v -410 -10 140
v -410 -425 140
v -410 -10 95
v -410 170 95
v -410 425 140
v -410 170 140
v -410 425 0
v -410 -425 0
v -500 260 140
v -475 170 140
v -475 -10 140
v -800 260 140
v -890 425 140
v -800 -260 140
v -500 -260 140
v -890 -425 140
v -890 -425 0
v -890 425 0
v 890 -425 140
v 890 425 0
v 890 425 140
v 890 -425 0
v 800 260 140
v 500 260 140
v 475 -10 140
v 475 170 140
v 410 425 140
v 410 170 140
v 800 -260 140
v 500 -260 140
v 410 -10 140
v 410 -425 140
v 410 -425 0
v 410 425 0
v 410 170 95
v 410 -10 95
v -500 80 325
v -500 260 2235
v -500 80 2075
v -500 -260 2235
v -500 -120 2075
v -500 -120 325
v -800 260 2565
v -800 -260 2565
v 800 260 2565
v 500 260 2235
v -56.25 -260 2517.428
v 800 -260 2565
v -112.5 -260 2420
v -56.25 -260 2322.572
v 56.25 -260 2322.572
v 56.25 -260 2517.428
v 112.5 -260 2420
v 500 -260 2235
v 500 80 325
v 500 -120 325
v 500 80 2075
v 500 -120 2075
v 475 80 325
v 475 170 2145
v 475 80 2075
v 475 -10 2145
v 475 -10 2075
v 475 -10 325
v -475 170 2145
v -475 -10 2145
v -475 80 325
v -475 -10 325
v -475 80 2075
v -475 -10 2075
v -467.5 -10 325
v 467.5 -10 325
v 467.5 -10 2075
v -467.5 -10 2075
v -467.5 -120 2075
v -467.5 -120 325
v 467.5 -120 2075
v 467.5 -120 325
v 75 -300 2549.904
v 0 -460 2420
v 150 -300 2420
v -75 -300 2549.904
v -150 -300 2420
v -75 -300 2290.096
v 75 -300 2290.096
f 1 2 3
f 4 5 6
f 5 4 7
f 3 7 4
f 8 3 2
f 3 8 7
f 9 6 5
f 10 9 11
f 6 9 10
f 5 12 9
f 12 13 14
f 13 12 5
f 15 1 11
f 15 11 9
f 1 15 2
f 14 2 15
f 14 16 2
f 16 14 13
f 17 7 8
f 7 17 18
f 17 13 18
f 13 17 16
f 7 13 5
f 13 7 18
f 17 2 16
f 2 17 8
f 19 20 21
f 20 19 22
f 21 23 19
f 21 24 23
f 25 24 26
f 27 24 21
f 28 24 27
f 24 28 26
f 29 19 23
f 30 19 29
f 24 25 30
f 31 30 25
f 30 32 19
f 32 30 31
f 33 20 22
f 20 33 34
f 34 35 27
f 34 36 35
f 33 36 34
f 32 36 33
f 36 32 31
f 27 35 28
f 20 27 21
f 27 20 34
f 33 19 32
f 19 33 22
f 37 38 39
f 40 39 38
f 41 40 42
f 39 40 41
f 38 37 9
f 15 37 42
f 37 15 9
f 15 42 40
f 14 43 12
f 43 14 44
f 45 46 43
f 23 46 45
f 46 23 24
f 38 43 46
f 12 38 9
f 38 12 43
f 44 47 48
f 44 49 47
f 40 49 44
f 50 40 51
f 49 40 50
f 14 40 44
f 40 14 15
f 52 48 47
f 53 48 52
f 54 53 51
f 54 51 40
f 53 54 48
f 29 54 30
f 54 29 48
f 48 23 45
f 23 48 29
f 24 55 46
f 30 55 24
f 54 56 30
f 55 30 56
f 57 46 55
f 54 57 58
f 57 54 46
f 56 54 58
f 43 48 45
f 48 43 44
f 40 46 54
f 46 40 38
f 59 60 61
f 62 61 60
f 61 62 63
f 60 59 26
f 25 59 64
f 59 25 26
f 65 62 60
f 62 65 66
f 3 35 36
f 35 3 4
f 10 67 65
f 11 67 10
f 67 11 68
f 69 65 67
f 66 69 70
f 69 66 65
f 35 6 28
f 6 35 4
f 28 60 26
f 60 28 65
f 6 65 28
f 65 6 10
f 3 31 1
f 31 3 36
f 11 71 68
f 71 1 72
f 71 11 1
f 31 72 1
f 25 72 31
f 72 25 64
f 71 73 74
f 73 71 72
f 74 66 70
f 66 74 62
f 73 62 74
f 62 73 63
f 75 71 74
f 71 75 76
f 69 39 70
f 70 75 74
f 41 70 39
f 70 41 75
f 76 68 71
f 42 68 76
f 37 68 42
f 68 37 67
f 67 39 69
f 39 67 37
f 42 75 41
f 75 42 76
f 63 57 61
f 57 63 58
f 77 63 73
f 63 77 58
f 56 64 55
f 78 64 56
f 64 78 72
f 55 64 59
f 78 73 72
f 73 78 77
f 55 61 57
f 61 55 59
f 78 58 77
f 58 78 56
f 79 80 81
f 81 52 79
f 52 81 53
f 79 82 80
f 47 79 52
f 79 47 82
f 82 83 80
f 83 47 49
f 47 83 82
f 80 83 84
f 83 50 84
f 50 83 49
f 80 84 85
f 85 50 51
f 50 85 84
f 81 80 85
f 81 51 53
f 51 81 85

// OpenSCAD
// Generated by AXM Machine Geometry Foundry 0.4.0
// Asset: AXM-DOORWAY-001 AXM Modular Powered Doorway v0.4.0
// Units: millimetres; source orientation: +Z up, -Y forward.
// Canonical source is recipe.json. This is an editable generated bridge.

// instance: foot__l00 | base: foot | print_group: foot
color([0.09412, 0.11373, 0.15294, 1.00000])
translate([-650, 0, 70]) rotate([0, 0, 0]) scale([1, 1, 1]) cube([480, 850, 140], center=true);

// instance: foot__l01 | base: foot | print_group: foot
color([0.09412, 0.11373, 0.15294, 1.00000])
translate([650, 0, 70]) rotate([0, 0, 0]) scale([1, 1, 1]) cube([480, 850, 140], center=true);

// instance: column__l00 | base: column | print_group: column
color([0.17647, 0.22745, 0.29804, 1.00000])
translate([-650, 0, 1250]) rotate([0, 0, 0]) scale([1, 1, 1]) cube([300, 520, 2300], center=true);

// instance: column__l01 | base: column | print_group: column
color([0.17647, 0.22745, 0.29804, 1.00000])
translate([650, 0, 1250]) rotate([0, 0, 0]) scale([1, 1, 1]) cube([300, 520, 2300], center=true);

// instance: top_beam | base: top_beam | print_group: top_beam
color([0.17647, 0.22745, 0.29804, 1.00000])
translate([0, 0, 2400]) rotate([0, 0, 0]) scale([1, 1, 1]) cube([1600, 520, 330], center=true);

// instance: door | base: door | print_group: door
color([0.09412, 0.11373, 0.15294, 1.00000])
translate([0, 80, 1120]) rotate([0, 0, 0]) scale([1, 1, 1]) cube([950, 180, 2050], center=true);

// instance: energy_strip__l00 | base: energy_strip | print_group: energy_strip
color([0.13725, 0.80392, 0.92157, 1.00000])
translate([-500, -20, 1200]) rotate([0, 0, 0]) scale([1, 1, 1]) cube([65, 200, 1750], center=true);

// instance: energy_strip__l01 | base: energy_strip | print_group: energy_strip
color([0.13725, 0.80392, 0.92157, 1.00000])
translate([500, -20, 1200]) rotate([0, 0, 0]) scale([1, 1, 1]) cube([65, 200, 1750], center=true);

// instance: header_core | base: header_core | print_group: header_core
color([0.66275, 0.32157, 1.00000, 0.92157])
translate([0, -300, 2420]) rotate([90, 0, 0]) scale([1, 1, 1]) polyhedron(points=[[150.0, 0.0, 0.0], [75.0, 129.90381057, 0.0], [-75.0, 129.90381057, 0.0], [-150.0, 0.0, 0.0], [-75.0, -129.90381057, 0.0], [75.0, -129.90381057, 0.0], [0.0, 0.0, 160.0], [0.0, 0.0, -160.0]], faces=[[6, 0, 1], [7, 1, 0], [6, 1, 2], [7, 2, 1], [6, 2, 3], [7, 3, 2], [6, 3, 4], [7, 4, 3], [6, 4, 5], [7, 5, 4], [6, 5, 0], [7, 0, 5]], convexity=10);
